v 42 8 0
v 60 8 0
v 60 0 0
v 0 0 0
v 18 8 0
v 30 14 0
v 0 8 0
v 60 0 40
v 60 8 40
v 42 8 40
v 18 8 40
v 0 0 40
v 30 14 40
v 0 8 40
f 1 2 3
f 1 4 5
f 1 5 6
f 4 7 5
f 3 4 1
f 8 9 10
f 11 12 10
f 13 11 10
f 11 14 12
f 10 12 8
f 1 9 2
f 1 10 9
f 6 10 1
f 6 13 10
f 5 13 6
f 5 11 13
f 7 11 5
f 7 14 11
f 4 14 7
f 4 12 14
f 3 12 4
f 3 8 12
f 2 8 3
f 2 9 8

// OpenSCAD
$fn = 32;

// ----------------------------------------------------------------------
// V guide rail: vrib, 60 mm wide
// ----------------------------------------------------------------------

// --- parameters (mm) ---
rail_w = 60;              // rail width, X
base_t = 8;               // base plate thickness
v_depth = 6;              // V feature depth / height
v_half_w = 12;            // half width of the V at the base face
plate_t = 40;             // rail length, Z (the extrusion height)

profile = [[0, 0], [60, 0], [60, 8], [42, 8], [30, 14], [18, 8], [0, 8]];  // primary outline, 7 points, counter clockwise

// --- the one profile operation ---
linear_extrude(height = plate_t) polygon(points = profile);
